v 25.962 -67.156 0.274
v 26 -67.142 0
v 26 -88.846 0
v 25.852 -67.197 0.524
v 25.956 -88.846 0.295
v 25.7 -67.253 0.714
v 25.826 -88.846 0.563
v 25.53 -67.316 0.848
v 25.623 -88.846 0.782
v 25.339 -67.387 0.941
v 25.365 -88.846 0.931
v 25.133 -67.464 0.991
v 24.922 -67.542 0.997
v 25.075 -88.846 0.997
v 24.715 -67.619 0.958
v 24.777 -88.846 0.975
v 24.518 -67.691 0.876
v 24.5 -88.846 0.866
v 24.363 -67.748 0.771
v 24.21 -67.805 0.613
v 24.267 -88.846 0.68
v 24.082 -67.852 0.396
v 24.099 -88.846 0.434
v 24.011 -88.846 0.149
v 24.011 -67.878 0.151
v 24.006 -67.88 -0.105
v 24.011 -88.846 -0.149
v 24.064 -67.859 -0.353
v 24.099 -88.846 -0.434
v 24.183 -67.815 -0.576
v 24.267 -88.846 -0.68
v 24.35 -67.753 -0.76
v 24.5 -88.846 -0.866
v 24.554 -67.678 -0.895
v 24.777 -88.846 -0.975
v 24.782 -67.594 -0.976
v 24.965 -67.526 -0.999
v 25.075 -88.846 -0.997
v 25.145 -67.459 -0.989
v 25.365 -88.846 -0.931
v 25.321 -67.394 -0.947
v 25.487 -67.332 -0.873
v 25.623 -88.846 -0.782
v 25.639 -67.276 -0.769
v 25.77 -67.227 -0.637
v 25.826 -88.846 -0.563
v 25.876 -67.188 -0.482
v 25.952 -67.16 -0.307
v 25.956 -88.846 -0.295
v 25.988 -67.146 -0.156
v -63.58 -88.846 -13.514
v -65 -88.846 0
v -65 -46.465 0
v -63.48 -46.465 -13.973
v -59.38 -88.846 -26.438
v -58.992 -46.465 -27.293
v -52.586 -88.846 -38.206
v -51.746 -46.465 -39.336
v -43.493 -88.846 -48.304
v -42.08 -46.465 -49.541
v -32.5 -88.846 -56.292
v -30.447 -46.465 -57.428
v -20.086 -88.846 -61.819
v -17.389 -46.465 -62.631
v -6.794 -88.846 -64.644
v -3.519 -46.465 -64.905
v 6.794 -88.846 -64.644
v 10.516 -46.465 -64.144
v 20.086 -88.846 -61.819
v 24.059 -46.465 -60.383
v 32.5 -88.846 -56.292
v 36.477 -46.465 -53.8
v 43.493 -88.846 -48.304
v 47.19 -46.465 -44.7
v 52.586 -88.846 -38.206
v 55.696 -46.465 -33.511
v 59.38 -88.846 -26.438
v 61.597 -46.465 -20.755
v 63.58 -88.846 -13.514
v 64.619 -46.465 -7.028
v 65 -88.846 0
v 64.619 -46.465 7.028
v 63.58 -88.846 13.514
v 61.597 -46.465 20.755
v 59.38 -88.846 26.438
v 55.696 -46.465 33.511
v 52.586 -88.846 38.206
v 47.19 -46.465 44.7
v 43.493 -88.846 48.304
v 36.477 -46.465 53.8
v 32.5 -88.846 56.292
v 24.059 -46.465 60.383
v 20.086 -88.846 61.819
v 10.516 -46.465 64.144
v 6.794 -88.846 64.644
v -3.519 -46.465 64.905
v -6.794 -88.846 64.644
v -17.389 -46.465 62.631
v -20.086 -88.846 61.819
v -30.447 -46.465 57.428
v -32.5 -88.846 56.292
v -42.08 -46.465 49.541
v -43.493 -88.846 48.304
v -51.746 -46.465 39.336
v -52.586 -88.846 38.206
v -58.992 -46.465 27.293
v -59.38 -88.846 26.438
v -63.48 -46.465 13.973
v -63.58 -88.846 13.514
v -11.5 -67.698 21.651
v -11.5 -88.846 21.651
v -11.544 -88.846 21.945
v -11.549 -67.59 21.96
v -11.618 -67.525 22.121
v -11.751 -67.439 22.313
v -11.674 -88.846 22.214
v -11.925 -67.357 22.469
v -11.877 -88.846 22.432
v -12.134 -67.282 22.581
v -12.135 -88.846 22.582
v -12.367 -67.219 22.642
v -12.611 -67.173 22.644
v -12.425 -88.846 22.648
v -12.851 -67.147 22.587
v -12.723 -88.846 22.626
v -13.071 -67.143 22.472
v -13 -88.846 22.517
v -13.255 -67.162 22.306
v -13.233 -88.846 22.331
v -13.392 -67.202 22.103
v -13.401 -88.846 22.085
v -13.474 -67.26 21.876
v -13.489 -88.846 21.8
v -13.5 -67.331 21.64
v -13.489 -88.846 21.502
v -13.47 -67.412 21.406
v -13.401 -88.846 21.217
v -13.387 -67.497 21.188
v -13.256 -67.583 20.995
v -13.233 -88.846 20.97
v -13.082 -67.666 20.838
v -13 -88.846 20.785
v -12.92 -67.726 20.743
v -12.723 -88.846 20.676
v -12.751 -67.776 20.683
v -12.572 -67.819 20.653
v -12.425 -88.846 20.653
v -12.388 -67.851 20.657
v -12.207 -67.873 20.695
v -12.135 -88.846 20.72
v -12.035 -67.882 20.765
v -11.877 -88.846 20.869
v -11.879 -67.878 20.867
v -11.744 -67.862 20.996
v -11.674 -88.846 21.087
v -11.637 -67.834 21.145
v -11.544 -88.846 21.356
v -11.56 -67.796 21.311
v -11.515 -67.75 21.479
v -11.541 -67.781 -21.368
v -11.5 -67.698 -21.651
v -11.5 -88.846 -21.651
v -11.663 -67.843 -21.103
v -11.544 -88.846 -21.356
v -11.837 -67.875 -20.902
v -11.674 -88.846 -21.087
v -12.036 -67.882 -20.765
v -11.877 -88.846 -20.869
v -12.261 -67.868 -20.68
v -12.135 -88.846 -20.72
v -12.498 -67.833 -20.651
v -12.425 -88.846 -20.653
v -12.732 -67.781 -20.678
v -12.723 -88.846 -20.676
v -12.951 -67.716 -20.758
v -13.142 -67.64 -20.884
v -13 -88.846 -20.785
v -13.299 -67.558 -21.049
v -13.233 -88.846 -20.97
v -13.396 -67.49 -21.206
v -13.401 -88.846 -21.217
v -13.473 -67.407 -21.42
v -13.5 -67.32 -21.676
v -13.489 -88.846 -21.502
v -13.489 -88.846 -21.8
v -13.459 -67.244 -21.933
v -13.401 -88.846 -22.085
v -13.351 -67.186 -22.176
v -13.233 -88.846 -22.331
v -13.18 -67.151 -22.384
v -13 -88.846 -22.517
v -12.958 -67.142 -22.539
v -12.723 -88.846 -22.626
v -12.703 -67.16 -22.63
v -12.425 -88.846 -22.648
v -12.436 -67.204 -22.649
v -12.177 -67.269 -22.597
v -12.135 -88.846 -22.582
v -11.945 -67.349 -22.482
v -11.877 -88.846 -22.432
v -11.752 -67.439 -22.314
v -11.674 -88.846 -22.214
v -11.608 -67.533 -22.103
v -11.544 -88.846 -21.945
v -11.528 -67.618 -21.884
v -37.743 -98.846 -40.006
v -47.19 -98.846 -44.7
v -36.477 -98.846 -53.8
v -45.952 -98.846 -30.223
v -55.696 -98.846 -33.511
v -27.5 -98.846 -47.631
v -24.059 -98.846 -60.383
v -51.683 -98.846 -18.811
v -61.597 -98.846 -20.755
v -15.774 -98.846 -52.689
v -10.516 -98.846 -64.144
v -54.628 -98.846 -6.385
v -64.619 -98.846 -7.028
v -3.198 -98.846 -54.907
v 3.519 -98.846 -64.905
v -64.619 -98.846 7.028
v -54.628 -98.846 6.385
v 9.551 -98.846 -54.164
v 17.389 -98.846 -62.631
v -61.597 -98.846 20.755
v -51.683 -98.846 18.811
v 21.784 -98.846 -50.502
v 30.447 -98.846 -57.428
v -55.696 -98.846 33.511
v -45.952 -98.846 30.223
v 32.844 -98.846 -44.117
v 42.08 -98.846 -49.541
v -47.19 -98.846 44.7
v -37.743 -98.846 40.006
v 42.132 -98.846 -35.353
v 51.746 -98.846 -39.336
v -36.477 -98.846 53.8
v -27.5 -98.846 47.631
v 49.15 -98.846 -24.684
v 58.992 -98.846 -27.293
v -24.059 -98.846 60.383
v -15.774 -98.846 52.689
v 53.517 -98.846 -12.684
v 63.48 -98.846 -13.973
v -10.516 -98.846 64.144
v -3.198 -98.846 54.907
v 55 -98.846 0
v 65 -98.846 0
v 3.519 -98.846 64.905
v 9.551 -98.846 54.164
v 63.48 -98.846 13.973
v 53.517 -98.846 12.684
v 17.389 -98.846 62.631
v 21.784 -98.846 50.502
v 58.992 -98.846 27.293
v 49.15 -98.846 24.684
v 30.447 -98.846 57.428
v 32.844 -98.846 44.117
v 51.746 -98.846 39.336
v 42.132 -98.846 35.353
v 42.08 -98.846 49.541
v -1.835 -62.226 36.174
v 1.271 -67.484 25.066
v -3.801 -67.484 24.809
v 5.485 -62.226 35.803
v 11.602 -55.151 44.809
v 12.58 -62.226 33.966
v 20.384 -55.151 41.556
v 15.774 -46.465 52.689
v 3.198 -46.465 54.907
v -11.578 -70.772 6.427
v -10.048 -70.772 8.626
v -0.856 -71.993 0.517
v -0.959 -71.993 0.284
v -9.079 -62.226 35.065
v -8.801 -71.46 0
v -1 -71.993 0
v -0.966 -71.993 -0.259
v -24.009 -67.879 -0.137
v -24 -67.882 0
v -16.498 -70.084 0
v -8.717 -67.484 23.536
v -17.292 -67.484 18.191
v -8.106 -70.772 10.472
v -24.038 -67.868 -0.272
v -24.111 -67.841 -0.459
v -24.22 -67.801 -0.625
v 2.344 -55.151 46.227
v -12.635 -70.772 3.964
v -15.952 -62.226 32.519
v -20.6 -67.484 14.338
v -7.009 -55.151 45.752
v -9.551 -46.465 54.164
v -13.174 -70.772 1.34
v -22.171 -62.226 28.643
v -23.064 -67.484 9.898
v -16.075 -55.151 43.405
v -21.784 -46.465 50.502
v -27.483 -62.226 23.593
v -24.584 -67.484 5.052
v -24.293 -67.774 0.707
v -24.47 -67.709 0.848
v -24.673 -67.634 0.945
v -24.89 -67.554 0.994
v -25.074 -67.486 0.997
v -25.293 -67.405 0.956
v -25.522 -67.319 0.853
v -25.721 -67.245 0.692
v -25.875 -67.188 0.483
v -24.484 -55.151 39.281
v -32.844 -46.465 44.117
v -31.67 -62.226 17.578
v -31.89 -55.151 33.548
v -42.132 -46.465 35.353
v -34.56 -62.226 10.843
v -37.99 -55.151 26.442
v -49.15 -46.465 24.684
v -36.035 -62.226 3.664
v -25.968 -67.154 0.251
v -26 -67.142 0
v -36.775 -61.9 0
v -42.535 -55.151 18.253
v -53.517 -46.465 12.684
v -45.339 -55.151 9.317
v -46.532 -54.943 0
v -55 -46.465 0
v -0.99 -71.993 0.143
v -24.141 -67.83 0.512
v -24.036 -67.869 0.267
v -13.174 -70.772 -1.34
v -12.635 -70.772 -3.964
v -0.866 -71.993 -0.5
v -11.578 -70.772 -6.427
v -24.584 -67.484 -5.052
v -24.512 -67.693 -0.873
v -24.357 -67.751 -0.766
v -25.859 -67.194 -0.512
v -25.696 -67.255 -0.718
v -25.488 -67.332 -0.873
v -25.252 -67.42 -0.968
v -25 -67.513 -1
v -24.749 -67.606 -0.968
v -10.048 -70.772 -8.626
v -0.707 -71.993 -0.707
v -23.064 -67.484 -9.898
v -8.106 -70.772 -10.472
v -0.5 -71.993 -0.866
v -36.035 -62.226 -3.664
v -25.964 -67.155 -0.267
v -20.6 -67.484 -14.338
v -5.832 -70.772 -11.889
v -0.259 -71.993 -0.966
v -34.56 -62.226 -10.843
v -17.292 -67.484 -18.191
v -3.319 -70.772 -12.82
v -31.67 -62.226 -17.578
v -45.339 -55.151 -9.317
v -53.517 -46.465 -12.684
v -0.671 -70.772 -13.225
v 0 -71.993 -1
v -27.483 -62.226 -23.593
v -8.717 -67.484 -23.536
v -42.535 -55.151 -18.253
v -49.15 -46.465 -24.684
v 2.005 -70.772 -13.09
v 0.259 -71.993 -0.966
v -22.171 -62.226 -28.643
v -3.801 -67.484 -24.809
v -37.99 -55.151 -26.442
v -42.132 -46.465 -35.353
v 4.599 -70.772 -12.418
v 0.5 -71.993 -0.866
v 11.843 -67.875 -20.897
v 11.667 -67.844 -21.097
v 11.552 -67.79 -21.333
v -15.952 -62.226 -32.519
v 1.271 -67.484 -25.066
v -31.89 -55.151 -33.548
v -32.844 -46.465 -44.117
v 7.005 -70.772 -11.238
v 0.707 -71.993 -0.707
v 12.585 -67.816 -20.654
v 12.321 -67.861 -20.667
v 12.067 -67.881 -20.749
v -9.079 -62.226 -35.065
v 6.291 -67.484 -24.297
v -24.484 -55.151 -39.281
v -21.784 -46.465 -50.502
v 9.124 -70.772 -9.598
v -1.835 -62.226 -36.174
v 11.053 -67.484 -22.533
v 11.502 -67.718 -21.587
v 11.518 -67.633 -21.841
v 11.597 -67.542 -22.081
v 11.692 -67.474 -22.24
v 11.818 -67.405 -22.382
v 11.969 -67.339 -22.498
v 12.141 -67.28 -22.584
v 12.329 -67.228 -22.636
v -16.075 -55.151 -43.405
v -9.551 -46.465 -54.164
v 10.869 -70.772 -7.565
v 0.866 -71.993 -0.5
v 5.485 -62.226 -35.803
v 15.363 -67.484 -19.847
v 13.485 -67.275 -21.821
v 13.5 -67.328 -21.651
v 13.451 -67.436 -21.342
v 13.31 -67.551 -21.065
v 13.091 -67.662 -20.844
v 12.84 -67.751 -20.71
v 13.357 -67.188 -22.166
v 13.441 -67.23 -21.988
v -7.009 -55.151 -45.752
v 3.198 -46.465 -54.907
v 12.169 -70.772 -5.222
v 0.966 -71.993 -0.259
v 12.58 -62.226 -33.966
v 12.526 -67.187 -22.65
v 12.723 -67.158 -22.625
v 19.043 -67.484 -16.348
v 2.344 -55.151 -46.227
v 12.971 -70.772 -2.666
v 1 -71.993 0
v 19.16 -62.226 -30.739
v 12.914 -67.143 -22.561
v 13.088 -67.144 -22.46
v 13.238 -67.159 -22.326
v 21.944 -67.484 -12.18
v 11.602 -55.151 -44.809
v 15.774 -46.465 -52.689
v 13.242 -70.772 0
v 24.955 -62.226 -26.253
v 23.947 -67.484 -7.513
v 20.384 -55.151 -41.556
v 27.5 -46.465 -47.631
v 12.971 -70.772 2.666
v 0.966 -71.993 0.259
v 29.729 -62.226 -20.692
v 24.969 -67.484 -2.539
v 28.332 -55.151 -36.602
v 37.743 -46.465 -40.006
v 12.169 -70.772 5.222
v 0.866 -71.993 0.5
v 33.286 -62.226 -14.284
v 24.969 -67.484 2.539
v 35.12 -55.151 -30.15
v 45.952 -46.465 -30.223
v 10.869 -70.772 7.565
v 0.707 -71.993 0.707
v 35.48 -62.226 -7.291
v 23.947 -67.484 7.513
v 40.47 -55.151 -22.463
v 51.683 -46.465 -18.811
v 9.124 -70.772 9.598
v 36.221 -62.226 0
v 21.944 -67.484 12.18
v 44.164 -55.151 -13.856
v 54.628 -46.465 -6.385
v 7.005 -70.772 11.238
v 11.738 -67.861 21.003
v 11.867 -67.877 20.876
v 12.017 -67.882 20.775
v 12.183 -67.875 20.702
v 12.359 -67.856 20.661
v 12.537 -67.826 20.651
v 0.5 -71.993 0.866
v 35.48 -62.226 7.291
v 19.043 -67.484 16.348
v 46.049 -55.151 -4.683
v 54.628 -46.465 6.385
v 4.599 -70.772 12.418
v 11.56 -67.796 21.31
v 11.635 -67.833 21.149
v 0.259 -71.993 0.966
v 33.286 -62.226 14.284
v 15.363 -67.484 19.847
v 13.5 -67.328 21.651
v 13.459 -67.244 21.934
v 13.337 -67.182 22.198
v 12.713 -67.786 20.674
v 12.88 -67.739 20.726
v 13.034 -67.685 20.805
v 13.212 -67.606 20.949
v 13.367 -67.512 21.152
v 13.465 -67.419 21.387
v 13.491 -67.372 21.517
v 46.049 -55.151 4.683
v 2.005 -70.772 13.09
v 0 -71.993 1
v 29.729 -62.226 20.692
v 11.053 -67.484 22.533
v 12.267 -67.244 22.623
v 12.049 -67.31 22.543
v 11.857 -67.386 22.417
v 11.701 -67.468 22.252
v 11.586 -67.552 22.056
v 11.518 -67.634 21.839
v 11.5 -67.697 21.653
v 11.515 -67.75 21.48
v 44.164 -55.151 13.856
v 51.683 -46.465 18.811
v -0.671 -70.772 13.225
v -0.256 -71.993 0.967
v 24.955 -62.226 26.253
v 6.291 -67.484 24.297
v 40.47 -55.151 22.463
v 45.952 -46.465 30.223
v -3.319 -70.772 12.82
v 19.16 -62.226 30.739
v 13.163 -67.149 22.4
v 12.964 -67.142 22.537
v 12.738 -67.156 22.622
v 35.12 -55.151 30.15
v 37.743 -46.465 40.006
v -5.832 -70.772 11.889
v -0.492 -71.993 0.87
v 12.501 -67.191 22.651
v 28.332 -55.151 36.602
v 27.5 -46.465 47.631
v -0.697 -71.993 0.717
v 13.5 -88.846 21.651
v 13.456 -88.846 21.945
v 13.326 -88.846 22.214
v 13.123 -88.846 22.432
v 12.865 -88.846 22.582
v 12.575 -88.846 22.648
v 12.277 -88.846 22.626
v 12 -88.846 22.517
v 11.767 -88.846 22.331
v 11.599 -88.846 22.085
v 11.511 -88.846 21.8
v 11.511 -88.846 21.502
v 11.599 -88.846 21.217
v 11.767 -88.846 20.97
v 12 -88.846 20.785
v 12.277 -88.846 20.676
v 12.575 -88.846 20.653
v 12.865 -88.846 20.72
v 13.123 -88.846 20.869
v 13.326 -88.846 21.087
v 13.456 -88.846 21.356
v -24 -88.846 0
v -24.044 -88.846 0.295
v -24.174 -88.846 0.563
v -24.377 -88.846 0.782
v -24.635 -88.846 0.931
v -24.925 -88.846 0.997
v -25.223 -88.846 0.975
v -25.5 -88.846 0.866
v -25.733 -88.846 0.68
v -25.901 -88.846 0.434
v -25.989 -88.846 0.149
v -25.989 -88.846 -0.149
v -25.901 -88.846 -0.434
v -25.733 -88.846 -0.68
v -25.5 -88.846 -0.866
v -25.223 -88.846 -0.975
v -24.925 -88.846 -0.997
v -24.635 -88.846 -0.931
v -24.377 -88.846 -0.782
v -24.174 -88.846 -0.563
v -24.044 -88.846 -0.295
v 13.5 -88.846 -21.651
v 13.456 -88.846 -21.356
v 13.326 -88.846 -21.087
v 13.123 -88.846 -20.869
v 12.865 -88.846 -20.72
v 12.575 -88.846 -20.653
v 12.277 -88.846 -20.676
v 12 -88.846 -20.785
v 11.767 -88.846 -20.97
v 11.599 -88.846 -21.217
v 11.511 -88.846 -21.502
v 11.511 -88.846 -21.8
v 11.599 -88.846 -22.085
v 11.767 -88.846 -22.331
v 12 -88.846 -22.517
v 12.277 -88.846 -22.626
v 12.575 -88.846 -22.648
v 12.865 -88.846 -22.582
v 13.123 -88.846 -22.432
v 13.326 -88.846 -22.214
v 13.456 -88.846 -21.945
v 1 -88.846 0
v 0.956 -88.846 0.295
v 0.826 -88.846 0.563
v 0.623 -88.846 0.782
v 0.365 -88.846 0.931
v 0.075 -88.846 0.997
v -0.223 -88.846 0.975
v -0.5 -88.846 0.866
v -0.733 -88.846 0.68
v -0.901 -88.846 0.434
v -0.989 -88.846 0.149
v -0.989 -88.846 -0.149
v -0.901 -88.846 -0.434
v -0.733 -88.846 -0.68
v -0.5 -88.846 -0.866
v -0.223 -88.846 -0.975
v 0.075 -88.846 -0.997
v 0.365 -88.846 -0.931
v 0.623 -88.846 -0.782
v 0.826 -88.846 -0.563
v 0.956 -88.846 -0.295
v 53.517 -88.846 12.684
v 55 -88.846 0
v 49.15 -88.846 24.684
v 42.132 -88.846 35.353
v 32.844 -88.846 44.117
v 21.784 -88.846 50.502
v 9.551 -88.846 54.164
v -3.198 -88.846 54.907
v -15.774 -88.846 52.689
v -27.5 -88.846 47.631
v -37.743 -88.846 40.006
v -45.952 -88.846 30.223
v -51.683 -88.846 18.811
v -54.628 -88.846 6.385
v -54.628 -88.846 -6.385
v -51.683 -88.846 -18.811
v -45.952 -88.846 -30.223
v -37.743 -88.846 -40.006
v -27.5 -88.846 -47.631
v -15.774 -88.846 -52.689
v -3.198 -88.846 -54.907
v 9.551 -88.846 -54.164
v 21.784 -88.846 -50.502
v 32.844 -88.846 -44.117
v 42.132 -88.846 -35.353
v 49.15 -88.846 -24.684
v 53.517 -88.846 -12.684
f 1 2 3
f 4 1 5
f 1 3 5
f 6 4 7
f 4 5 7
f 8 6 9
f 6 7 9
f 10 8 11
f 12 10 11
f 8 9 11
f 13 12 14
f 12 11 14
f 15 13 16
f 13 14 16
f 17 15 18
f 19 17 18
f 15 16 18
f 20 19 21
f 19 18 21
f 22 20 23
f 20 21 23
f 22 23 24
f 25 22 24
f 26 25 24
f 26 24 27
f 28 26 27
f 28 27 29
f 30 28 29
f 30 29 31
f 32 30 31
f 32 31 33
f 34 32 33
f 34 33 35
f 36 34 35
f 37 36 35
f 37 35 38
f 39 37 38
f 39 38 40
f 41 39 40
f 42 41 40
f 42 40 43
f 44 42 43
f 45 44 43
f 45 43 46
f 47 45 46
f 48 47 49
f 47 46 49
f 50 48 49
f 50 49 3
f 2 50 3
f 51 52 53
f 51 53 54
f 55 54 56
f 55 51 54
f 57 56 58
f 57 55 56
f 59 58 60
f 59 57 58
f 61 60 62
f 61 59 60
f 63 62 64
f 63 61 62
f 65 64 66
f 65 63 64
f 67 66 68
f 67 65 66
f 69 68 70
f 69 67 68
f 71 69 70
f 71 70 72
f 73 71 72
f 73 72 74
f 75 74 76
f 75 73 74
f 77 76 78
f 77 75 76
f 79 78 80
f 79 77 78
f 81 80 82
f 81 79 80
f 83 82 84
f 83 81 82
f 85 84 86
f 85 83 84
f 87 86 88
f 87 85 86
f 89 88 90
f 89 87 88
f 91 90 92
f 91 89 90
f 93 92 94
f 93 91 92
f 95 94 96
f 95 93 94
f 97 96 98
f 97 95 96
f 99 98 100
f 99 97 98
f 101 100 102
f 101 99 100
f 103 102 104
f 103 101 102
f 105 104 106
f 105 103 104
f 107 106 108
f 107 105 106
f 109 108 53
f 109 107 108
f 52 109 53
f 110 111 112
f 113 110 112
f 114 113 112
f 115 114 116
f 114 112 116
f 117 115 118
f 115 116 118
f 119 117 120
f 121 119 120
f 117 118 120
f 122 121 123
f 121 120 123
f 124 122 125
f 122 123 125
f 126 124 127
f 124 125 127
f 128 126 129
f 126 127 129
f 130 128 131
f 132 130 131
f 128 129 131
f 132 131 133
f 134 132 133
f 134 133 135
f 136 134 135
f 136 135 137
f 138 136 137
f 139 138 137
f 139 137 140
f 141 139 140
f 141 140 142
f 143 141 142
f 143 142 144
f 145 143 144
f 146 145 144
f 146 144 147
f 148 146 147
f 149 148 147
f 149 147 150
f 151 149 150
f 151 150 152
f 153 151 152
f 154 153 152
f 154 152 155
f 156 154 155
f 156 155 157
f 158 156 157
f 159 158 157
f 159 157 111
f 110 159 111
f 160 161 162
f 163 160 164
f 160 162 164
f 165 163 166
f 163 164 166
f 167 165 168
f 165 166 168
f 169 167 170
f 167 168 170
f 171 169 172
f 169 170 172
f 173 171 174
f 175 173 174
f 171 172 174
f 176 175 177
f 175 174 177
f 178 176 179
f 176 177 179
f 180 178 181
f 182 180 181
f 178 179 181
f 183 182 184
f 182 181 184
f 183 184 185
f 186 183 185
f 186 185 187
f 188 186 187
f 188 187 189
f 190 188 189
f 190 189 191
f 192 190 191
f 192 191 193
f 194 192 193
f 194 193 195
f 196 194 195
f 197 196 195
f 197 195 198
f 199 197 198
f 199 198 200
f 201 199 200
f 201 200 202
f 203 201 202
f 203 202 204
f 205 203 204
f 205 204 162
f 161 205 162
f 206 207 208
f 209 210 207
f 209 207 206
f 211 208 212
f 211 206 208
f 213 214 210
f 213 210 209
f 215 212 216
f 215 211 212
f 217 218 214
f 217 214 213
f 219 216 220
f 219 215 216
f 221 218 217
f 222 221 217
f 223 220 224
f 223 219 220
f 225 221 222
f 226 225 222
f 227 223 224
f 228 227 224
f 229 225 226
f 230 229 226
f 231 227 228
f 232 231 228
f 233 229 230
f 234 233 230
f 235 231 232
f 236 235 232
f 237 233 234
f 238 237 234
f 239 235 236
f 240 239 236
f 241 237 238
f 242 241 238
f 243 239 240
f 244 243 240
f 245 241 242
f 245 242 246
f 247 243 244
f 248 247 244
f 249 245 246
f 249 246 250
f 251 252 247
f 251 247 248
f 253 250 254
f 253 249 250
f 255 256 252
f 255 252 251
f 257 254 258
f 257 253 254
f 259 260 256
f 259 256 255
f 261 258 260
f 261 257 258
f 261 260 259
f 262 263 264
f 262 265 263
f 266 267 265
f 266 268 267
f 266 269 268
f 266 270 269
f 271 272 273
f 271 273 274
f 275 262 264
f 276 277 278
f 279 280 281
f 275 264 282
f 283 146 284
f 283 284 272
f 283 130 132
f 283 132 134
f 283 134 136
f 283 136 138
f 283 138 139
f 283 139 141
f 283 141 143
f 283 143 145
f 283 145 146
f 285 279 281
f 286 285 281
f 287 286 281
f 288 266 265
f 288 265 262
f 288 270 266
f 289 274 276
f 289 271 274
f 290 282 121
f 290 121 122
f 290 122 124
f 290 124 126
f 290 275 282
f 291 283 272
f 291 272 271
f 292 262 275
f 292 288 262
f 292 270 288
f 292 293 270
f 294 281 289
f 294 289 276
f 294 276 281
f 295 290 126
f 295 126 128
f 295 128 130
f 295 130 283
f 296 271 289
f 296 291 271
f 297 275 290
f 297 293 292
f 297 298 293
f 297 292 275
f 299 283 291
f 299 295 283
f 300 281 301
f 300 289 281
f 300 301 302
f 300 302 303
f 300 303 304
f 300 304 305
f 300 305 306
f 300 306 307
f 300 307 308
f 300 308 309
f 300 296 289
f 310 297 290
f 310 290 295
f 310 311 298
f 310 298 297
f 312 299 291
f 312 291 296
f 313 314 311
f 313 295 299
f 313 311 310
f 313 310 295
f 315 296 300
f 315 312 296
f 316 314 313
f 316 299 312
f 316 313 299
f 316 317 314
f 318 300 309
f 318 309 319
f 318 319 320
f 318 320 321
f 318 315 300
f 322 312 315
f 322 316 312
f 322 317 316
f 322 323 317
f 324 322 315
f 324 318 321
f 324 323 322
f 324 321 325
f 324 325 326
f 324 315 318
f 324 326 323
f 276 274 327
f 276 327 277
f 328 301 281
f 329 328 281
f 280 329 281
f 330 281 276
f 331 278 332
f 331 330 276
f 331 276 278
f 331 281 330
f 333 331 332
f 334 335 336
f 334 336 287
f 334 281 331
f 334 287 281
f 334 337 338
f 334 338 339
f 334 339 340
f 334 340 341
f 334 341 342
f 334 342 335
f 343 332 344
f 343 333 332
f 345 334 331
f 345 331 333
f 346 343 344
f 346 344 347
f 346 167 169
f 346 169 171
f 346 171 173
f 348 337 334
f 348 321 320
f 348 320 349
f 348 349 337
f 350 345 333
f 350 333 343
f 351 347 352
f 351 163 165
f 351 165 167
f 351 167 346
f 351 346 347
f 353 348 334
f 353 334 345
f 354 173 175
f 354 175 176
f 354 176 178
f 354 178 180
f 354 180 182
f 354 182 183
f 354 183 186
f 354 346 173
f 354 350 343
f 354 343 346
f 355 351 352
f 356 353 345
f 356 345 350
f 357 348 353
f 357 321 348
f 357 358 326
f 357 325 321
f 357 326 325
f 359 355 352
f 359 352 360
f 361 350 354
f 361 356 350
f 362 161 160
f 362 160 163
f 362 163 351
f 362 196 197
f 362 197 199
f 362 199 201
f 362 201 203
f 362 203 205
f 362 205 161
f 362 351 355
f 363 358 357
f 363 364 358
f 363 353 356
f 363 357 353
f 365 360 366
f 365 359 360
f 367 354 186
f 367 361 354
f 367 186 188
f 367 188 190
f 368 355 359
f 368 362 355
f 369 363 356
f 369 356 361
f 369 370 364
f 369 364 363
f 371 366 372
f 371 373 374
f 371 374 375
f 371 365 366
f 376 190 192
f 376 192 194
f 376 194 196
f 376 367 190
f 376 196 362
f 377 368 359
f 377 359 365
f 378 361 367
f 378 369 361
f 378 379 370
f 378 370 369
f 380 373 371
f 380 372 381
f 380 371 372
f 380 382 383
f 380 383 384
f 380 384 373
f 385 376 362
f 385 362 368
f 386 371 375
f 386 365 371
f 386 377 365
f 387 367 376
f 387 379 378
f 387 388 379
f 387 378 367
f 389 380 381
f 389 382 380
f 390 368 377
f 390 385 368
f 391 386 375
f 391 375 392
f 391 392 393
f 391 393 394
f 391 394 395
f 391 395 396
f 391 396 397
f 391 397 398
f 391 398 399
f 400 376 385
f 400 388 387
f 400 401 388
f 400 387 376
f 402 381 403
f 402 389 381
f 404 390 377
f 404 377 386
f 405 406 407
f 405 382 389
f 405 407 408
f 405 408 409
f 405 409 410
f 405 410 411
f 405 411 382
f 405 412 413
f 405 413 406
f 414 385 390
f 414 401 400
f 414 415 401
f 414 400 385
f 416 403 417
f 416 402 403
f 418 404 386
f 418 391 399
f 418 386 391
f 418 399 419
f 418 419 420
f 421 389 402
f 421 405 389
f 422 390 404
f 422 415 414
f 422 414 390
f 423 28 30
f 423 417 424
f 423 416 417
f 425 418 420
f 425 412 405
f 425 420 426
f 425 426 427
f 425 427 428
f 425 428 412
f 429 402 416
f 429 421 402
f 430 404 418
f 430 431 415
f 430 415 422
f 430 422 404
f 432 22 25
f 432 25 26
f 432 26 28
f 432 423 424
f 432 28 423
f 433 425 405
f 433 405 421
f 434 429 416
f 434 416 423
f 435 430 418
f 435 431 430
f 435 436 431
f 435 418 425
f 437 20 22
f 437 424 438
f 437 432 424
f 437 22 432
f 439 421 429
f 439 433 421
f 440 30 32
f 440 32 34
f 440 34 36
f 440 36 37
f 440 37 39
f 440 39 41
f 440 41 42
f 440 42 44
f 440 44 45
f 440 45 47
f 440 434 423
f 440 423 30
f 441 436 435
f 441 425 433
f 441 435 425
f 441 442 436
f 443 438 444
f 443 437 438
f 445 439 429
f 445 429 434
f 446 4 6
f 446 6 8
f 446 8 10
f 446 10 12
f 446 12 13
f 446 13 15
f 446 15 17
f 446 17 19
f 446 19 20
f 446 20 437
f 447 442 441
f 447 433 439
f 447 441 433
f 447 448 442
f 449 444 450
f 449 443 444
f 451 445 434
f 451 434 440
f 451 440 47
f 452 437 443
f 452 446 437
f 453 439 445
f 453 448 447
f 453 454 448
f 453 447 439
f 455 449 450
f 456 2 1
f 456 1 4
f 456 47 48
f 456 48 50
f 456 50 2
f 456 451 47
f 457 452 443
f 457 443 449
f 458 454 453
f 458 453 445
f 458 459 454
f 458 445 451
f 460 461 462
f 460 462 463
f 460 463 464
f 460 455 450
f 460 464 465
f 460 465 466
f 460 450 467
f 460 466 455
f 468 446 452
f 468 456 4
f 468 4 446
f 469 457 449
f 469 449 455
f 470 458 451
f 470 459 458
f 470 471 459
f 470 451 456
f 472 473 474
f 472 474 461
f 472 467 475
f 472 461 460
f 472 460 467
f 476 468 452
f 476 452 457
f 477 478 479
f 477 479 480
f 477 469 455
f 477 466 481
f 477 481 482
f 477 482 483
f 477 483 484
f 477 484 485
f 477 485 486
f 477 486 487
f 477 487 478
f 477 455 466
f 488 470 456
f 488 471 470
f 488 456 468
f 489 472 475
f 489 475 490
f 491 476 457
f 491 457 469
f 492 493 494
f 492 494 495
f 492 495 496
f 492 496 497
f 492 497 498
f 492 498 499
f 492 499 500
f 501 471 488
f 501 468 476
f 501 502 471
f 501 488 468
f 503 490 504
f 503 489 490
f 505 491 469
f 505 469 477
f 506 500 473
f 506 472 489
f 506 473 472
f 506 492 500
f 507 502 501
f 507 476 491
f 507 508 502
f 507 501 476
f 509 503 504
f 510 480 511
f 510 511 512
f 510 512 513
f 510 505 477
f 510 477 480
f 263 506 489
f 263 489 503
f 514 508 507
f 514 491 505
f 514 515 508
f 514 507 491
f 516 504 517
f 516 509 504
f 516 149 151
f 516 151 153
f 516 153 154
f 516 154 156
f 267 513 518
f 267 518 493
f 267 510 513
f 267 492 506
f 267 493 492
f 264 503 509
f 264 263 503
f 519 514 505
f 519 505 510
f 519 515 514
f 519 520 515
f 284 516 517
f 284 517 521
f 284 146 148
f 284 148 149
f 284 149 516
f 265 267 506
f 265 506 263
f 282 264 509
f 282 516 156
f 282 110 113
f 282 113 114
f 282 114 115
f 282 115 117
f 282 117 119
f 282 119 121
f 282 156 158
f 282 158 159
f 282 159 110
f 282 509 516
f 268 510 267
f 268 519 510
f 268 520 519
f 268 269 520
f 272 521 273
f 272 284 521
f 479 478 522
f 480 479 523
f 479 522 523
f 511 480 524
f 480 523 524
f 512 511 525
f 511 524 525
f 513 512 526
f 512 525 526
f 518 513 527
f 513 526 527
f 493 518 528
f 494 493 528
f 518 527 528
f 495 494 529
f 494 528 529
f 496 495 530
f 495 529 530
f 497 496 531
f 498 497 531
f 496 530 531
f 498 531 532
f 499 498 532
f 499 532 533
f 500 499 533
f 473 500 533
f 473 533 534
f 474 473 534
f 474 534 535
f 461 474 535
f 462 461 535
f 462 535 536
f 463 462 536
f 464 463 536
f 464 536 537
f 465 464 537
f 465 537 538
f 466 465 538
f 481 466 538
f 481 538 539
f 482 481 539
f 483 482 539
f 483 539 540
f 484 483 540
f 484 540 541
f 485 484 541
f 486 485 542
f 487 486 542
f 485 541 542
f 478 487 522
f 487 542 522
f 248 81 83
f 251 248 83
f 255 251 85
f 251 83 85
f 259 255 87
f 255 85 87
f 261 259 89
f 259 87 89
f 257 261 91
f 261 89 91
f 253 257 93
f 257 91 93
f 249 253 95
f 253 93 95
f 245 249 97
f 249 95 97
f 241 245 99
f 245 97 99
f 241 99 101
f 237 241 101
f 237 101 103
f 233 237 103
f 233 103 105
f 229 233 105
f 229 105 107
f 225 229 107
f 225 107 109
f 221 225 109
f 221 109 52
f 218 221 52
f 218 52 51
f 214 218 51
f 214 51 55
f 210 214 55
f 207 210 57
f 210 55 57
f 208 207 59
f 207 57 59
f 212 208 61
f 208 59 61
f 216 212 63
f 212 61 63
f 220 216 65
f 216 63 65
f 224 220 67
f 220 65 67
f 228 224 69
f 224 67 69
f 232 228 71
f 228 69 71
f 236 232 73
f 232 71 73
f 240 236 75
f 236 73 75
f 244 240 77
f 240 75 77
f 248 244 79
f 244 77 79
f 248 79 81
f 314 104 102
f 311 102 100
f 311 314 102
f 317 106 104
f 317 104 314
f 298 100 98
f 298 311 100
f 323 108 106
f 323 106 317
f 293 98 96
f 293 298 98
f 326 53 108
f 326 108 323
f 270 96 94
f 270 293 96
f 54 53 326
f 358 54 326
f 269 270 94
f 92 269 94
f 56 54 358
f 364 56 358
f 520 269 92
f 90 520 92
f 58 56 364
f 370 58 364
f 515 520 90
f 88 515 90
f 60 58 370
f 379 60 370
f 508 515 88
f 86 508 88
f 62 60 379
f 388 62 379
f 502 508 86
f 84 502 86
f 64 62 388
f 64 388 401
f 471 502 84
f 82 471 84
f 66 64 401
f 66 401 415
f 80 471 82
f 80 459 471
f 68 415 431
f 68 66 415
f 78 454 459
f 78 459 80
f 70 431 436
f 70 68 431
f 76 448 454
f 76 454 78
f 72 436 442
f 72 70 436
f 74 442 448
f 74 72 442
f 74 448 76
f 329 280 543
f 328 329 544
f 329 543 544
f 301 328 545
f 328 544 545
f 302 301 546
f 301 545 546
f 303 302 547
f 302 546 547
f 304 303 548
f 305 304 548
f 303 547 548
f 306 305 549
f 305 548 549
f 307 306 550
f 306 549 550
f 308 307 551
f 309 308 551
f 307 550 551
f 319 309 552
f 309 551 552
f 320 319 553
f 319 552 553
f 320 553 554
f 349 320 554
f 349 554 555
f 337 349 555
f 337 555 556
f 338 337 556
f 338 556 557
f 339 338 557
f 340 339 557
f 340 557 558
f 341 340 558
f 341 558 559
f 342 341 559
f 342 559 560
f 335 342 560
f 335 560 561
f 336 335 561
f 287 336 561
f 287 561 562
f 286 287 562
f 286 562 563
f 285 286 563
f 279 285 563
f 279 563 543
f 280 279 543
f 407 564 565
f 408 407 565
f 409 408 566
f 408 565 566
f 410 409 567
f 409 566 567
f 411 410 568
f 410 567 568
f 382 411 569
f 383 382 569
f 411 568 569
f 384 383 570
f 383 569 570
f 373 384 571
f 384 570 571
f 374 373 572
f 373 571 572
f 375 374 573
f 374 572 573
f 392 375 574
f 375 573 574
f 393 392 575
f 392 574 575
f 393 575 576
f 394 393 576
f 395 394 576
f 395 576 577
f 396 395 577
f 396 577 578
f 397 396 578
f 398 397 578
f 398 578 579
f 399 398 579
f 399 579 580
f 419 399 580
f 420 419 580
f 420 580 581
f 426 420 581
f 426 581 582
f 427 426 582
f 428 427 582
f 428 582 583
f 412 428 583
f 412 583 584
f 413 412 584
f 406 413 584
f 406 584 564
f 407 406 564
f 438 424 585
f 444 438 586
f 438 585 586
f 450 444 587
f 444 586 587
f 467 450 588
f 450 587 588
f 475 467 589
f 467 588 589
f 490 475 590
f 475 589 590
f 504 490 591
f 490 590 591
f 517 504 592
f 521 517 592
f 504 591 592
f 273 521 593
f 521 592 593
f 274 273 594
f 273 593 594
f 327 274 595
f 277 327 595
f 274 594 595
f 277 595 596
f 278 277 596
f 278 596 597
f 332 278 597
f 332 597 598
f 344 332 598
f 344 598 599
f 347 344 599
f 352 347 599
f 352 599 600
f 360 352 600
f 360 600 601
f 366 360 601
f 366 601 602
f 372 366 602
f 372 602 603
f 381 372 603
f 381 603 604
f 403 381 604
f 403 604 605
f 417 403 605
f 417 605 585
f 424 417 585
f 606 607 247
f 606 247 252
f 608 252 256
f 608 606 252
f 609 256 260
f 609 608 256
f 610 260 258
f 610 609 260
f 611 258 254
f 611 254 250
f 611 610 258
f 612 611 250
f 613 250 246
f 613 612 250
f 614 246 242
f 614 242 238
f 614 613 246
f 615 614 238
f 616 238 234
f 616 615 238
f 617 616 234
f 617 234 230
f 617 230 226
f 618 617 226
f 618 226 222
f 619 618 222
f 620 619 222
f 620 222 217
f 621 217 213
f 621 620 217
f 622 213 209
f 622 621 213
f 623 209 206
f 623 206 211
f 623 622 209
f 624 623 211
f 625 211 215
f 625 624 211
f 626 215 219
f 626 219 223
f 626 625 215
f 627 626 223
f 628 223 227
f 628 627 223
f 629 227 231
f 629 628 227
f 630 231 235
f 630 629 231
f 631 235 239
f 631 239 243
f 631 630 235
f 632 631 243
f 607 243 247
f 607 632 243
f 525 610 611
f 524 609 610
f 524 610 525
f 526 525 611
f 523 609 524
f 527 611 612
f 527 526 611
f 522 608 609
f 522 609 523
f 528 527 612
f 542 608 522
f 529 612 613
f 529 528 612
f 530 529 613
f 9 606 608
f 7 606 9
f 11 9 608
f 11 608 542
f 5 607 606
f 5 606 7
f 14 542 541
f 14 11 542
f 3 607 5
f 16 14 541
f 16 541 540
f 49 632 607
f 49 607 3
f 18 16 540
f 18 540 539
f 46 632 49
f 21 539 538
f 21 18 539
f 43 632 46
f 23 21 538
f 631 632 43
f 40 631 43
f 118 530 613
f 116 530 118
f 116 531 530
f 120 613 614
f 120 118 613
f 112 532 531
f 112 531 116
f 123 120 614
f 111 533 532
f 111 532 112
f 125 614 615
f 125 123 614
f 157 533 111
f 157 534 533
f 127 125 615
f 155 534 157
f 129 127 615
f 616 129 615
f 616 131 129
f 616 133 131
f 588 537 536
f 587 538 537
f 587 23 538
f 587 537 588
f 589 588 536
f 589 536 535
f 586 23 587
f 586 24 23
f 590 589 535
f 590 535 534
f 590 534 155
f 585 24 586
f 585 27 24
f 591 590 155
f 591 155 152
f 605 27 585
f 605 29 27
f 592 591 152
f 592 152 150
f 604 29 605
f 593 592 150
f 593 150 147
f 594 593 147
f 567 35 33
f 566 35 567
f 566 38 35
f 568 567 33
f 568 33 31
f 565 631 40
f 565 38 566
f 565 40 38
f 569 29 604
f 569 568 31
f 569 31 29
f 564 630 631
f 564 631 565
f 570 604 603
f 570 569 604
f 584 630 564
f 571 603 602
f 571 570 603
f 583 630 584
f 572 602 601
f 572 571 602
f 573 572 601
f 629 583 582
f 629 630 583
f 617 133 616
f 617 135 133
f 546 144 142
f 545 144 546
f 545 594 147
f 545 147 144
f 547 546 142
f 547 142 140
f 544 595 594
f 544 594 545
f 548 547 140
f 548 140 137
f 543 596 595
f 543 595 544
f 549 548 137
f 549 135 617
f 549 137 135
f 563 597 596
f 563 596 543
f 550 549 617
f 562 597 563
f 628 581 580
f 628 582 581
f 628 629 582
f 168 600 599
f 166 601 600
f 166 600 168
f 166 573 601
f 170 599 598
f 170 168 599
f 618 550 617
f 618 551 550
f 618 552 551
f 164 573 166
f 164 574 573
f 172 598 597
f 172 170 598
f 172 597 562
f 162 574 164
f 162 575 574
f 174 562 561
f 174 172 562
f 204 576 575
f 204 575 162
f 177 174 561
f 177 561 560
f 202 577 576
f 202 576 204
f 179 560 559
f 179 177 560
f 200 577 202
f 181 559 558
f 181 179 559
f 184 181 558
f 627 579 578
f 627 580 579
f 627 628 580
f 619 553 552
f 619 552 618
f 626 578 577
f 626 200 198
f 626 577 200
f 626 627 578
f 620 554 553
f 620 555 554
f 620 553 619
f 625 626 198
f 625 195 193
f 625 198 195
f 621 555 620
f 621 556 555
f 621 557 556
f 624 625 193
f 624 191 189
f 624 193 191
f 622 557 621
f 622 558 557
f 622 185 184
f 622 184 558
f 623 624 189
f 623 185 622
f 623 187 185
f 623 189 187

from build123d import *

# Parameters (mm, degrees)
SKETCH4_R           = 1
CUT_EXTRUDE3_DEPTH  = 43.380808577
SKETCH6_R           = 65
SKETCH6_R_2         = 55
BOSS_EXTRUDE1_DEPTH = 10


with BuildPart() as part:
    # Sketch2 → Revolve1 (revolve)
    with BuildSketch(Plane.XY):
        with BuildLine():
            Line((0, -88.845849199), (0, -72))
            ThreePointArc((0, -72), (-30.319276667, -65.304988036), (-55, -46.465040622))
            Line((-55, -46.465040622), (-65, -46.465040622))
            Line((-65, -46.465040622), (-65, -88.845849199))
            Line((-65, -88.845849199), (-55, -88.845849199))
            Line((-55, -88.845849199), (0, -88.845849199))
        make_face()
    revolve(axis=Axis((0, -72, 0), (0, -1, 0)))

    # Sketch4 → Cut-Extrude3 (cut, through all)
    with BuildSketch(Plane.XZ.offset(88.845849199)):
        Circle(SKETCH4_R)
        with Locations((25, 0)):
            Circle(SKETCH4_R)
        with Locations((12.5, -21.650635095)):
            Circle(SKETCH4_R)
        with Locations((-12.5, -21.650635095)):
            Circle(SKETCH4_R)
        with Locations((-25, 0)):
            Circle(SKETCH4_R)
        with Locations((-12.5, 21.650635095)):
            Circle(SKETCH4_R)
        with Locations((12.5, 21.650635095)):
            Circle(SKETCH4_R)
    extrude(amount=-CUT_EXTRUDE3_DEPTH, mode=Mode.SUBTRACT)

    # Sketch6 → Boss-Extrude1 (add)
    with BuildSketch(Plane.XZ.offset(88.845849199)):
        Circle(SKETCH6_R)
        Circle(SKETCH6_R_2, mode=Mode.SUBTRACT)
    extrude(amount=BOSS_EXTRUDE1_DEPTH)


solid = part.part
